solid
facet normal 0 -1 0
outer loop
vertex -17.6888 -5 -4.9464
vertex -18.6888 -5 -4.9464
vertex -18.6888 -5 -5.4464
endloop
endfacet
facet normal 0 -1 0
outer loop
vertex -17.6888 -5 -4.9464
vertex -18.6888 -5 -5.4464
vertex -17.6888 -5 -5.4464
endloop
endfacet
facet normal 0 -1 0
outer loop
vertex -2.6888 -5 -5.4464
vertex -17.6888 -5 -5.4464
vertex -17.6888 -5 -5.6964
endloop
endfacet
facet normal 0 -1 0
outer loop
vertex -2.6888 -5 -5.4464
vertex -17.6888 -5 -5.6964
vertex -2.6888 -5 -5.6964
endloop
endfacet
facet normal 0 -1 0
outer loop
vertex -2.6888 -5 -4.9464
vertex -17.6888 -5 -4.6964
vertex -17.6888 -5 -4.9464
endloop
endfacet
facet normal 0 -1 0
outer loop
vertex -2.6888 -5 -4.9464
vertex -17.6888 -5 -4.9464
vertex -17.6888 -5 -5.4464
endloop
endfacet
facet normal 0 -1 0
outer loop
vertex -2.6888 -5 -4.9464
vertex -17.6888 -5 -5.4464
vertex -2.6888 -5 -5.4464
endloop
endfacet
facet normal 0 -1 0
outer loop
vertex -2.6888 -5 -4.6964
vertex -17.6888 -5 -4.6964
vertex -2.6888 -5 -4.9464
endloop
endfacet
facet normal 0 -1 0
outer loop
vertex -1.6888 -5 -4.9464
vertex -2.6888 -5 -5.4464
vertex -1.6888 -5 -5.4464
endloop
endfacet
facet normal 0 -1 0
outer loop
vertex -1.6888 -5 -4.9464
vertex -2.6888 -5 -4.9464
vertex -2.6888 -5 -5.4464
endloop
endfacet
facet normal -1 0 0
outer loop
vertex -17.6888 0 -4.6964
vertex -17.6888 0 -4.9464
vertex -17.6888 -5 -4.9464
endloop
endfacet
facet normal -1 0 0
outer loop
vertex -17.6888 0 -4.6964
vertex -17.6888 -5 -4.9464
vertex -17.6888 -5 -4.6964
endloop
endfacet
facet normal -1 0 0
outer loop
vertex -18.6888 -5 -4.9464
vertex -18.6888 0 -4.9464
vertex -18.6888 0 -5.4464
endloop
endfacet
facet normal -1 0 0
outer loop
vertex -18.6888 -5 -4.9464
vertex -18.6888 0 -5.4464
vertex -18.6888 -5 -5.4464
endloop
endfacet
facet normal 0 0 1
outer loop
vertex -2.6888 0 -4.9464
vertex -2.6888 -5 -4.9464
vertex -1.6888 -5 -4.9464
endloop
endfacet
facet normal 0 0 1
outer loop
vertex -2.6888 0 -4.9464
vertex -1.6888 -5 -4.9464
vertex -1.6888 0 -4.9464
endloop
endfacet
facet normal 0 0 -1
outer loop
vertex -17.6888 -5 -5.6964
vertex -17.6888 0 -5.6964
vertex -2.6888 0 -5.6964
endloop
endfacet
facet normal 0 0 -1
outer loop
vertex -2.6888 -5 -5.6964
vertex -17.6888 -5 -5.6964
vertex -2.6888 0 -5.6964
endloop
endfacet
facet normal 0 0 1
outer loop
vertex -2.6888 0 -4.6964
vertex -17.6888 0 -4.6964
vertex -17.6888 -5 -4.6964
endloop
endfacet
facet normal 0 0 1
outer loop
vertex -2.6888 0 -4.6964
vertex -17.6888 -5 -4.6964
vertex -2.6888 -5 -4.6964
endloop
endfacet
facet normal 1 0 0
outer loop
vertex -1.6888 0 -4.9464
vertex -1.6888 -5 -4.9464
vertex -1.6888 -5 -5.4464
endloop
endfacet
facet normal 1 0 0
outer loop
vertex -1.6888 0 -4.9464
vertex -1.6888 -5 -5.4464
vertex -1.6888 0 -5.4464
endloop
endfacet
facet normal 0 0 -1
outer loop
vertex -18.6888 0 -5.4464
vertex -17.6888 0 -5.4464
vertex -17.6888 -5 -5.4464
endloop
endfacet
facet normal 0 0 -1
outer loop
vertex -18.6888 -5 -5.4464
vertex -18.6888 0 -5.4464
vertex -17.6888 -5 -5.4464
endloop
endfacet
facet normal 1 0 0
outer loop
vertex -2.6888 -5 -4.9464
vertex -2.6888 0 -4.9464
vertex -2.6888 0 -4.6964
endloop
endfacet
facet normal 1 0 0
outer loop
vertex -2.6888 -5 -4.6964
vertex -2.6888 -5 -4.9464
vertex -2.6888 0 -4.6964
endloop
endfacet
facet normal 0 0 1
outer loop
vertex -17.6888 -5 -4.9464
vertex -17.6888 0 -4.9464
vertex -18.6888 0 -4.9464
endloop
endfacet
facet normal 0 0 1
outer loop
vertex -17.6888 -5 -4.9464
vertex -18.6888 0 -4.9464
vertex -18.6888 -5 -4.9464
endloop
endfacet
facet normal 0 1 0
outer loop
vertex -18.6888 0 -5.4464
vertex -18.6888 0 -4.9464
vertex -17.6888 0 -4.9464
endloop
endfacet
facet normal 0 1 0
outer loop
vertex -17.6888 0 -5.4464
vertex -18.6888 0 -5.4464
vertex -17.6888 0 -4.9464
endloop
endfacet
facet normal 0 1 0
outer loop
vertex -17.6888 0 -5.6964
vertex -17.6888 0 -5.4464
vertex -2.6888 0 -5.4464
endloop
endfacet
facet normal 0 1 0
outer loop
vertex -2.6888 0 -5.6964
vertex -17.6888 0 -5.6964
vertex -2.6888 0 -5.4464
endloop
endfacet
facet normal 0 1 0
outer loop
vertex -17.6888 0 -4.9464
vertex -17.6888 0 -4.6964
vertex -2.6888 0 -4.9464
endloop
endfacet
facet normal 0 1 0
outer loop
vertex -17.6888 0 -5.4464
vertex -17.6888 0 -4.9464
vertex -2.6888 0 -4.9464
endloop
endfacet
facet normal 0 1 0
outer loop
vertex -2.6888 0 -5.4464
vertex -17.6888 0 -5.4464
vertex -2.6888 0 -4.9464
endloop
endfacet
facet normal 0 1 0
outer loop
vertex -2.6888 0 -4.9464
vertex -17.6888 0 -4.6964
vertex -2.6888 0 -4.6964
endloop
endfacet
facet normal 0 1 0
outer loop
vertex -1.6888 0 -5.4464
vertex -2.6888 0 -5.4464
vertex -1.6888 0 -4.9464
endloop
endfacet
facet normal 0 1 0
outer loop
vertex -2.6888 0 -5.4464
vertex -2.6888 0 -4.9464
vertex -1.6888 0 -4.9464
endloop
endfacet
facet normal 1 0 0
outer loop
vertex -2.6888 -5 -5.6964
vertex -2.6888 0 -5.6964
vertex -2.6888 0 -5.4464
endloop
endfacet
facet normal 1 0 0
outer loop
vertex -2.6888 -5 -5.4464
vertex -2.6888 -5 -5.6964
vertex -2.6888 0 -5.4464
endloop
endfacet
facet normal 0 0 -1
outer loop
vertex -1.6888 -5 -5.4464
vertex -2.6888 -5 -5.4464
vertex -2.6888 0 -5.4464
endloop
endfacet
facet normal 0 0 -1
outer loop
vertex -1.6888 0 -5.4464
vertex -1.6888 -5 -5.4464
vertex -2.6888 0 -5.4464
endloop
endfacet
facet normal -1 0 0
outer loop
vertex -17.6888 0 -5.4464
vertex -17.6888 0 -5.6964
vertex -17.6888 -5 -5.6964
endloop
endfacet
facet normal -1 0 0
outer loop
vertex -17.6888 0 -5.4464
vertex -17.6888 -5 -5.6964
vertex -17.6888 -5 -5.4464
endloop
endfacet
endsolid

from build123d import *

# Parameters (mm, degrees)
F0_W     = 15
F0_H     = 1
F1_DEPTH = 5
F2_W     = 5
F2_H     = 0.5
F3_DEPTH = 1
F4_W     = 5
F4_H     = 0.5
F5_DEPTH = 1


with BuildPart() as f1:
    # F0 (on Front) → F1 (new body)
    with BuildSketch(Plane.XZ):
        with Locations((-10.18877, -5.196384)):
            Rectangle(F0_W, F0_H)
    extrude(amount=F1_DEPTH)

    # F2 (on face) → F3 (join)
    with BuildSketch(Plane(origin=(-17.68877, 0, 0), x_dir=(0, -1, 0), z_dir=(-1, 0, 0))):
        with Locations((2.5, -5.196384)):
            Rectangle(F2_W, F2_H)
    extrude(amount=F3_DEPTH)

    # F4 (on face) → F5 (join)
    with BuildSketch(Plane.YZ.offset(-2.68877)):
        with Locations((-2.5, -5.196384)):
            Rectangle(F4_W, F4_H)
    extrude(amount=F5_DEPTH)


solid = f1.part
